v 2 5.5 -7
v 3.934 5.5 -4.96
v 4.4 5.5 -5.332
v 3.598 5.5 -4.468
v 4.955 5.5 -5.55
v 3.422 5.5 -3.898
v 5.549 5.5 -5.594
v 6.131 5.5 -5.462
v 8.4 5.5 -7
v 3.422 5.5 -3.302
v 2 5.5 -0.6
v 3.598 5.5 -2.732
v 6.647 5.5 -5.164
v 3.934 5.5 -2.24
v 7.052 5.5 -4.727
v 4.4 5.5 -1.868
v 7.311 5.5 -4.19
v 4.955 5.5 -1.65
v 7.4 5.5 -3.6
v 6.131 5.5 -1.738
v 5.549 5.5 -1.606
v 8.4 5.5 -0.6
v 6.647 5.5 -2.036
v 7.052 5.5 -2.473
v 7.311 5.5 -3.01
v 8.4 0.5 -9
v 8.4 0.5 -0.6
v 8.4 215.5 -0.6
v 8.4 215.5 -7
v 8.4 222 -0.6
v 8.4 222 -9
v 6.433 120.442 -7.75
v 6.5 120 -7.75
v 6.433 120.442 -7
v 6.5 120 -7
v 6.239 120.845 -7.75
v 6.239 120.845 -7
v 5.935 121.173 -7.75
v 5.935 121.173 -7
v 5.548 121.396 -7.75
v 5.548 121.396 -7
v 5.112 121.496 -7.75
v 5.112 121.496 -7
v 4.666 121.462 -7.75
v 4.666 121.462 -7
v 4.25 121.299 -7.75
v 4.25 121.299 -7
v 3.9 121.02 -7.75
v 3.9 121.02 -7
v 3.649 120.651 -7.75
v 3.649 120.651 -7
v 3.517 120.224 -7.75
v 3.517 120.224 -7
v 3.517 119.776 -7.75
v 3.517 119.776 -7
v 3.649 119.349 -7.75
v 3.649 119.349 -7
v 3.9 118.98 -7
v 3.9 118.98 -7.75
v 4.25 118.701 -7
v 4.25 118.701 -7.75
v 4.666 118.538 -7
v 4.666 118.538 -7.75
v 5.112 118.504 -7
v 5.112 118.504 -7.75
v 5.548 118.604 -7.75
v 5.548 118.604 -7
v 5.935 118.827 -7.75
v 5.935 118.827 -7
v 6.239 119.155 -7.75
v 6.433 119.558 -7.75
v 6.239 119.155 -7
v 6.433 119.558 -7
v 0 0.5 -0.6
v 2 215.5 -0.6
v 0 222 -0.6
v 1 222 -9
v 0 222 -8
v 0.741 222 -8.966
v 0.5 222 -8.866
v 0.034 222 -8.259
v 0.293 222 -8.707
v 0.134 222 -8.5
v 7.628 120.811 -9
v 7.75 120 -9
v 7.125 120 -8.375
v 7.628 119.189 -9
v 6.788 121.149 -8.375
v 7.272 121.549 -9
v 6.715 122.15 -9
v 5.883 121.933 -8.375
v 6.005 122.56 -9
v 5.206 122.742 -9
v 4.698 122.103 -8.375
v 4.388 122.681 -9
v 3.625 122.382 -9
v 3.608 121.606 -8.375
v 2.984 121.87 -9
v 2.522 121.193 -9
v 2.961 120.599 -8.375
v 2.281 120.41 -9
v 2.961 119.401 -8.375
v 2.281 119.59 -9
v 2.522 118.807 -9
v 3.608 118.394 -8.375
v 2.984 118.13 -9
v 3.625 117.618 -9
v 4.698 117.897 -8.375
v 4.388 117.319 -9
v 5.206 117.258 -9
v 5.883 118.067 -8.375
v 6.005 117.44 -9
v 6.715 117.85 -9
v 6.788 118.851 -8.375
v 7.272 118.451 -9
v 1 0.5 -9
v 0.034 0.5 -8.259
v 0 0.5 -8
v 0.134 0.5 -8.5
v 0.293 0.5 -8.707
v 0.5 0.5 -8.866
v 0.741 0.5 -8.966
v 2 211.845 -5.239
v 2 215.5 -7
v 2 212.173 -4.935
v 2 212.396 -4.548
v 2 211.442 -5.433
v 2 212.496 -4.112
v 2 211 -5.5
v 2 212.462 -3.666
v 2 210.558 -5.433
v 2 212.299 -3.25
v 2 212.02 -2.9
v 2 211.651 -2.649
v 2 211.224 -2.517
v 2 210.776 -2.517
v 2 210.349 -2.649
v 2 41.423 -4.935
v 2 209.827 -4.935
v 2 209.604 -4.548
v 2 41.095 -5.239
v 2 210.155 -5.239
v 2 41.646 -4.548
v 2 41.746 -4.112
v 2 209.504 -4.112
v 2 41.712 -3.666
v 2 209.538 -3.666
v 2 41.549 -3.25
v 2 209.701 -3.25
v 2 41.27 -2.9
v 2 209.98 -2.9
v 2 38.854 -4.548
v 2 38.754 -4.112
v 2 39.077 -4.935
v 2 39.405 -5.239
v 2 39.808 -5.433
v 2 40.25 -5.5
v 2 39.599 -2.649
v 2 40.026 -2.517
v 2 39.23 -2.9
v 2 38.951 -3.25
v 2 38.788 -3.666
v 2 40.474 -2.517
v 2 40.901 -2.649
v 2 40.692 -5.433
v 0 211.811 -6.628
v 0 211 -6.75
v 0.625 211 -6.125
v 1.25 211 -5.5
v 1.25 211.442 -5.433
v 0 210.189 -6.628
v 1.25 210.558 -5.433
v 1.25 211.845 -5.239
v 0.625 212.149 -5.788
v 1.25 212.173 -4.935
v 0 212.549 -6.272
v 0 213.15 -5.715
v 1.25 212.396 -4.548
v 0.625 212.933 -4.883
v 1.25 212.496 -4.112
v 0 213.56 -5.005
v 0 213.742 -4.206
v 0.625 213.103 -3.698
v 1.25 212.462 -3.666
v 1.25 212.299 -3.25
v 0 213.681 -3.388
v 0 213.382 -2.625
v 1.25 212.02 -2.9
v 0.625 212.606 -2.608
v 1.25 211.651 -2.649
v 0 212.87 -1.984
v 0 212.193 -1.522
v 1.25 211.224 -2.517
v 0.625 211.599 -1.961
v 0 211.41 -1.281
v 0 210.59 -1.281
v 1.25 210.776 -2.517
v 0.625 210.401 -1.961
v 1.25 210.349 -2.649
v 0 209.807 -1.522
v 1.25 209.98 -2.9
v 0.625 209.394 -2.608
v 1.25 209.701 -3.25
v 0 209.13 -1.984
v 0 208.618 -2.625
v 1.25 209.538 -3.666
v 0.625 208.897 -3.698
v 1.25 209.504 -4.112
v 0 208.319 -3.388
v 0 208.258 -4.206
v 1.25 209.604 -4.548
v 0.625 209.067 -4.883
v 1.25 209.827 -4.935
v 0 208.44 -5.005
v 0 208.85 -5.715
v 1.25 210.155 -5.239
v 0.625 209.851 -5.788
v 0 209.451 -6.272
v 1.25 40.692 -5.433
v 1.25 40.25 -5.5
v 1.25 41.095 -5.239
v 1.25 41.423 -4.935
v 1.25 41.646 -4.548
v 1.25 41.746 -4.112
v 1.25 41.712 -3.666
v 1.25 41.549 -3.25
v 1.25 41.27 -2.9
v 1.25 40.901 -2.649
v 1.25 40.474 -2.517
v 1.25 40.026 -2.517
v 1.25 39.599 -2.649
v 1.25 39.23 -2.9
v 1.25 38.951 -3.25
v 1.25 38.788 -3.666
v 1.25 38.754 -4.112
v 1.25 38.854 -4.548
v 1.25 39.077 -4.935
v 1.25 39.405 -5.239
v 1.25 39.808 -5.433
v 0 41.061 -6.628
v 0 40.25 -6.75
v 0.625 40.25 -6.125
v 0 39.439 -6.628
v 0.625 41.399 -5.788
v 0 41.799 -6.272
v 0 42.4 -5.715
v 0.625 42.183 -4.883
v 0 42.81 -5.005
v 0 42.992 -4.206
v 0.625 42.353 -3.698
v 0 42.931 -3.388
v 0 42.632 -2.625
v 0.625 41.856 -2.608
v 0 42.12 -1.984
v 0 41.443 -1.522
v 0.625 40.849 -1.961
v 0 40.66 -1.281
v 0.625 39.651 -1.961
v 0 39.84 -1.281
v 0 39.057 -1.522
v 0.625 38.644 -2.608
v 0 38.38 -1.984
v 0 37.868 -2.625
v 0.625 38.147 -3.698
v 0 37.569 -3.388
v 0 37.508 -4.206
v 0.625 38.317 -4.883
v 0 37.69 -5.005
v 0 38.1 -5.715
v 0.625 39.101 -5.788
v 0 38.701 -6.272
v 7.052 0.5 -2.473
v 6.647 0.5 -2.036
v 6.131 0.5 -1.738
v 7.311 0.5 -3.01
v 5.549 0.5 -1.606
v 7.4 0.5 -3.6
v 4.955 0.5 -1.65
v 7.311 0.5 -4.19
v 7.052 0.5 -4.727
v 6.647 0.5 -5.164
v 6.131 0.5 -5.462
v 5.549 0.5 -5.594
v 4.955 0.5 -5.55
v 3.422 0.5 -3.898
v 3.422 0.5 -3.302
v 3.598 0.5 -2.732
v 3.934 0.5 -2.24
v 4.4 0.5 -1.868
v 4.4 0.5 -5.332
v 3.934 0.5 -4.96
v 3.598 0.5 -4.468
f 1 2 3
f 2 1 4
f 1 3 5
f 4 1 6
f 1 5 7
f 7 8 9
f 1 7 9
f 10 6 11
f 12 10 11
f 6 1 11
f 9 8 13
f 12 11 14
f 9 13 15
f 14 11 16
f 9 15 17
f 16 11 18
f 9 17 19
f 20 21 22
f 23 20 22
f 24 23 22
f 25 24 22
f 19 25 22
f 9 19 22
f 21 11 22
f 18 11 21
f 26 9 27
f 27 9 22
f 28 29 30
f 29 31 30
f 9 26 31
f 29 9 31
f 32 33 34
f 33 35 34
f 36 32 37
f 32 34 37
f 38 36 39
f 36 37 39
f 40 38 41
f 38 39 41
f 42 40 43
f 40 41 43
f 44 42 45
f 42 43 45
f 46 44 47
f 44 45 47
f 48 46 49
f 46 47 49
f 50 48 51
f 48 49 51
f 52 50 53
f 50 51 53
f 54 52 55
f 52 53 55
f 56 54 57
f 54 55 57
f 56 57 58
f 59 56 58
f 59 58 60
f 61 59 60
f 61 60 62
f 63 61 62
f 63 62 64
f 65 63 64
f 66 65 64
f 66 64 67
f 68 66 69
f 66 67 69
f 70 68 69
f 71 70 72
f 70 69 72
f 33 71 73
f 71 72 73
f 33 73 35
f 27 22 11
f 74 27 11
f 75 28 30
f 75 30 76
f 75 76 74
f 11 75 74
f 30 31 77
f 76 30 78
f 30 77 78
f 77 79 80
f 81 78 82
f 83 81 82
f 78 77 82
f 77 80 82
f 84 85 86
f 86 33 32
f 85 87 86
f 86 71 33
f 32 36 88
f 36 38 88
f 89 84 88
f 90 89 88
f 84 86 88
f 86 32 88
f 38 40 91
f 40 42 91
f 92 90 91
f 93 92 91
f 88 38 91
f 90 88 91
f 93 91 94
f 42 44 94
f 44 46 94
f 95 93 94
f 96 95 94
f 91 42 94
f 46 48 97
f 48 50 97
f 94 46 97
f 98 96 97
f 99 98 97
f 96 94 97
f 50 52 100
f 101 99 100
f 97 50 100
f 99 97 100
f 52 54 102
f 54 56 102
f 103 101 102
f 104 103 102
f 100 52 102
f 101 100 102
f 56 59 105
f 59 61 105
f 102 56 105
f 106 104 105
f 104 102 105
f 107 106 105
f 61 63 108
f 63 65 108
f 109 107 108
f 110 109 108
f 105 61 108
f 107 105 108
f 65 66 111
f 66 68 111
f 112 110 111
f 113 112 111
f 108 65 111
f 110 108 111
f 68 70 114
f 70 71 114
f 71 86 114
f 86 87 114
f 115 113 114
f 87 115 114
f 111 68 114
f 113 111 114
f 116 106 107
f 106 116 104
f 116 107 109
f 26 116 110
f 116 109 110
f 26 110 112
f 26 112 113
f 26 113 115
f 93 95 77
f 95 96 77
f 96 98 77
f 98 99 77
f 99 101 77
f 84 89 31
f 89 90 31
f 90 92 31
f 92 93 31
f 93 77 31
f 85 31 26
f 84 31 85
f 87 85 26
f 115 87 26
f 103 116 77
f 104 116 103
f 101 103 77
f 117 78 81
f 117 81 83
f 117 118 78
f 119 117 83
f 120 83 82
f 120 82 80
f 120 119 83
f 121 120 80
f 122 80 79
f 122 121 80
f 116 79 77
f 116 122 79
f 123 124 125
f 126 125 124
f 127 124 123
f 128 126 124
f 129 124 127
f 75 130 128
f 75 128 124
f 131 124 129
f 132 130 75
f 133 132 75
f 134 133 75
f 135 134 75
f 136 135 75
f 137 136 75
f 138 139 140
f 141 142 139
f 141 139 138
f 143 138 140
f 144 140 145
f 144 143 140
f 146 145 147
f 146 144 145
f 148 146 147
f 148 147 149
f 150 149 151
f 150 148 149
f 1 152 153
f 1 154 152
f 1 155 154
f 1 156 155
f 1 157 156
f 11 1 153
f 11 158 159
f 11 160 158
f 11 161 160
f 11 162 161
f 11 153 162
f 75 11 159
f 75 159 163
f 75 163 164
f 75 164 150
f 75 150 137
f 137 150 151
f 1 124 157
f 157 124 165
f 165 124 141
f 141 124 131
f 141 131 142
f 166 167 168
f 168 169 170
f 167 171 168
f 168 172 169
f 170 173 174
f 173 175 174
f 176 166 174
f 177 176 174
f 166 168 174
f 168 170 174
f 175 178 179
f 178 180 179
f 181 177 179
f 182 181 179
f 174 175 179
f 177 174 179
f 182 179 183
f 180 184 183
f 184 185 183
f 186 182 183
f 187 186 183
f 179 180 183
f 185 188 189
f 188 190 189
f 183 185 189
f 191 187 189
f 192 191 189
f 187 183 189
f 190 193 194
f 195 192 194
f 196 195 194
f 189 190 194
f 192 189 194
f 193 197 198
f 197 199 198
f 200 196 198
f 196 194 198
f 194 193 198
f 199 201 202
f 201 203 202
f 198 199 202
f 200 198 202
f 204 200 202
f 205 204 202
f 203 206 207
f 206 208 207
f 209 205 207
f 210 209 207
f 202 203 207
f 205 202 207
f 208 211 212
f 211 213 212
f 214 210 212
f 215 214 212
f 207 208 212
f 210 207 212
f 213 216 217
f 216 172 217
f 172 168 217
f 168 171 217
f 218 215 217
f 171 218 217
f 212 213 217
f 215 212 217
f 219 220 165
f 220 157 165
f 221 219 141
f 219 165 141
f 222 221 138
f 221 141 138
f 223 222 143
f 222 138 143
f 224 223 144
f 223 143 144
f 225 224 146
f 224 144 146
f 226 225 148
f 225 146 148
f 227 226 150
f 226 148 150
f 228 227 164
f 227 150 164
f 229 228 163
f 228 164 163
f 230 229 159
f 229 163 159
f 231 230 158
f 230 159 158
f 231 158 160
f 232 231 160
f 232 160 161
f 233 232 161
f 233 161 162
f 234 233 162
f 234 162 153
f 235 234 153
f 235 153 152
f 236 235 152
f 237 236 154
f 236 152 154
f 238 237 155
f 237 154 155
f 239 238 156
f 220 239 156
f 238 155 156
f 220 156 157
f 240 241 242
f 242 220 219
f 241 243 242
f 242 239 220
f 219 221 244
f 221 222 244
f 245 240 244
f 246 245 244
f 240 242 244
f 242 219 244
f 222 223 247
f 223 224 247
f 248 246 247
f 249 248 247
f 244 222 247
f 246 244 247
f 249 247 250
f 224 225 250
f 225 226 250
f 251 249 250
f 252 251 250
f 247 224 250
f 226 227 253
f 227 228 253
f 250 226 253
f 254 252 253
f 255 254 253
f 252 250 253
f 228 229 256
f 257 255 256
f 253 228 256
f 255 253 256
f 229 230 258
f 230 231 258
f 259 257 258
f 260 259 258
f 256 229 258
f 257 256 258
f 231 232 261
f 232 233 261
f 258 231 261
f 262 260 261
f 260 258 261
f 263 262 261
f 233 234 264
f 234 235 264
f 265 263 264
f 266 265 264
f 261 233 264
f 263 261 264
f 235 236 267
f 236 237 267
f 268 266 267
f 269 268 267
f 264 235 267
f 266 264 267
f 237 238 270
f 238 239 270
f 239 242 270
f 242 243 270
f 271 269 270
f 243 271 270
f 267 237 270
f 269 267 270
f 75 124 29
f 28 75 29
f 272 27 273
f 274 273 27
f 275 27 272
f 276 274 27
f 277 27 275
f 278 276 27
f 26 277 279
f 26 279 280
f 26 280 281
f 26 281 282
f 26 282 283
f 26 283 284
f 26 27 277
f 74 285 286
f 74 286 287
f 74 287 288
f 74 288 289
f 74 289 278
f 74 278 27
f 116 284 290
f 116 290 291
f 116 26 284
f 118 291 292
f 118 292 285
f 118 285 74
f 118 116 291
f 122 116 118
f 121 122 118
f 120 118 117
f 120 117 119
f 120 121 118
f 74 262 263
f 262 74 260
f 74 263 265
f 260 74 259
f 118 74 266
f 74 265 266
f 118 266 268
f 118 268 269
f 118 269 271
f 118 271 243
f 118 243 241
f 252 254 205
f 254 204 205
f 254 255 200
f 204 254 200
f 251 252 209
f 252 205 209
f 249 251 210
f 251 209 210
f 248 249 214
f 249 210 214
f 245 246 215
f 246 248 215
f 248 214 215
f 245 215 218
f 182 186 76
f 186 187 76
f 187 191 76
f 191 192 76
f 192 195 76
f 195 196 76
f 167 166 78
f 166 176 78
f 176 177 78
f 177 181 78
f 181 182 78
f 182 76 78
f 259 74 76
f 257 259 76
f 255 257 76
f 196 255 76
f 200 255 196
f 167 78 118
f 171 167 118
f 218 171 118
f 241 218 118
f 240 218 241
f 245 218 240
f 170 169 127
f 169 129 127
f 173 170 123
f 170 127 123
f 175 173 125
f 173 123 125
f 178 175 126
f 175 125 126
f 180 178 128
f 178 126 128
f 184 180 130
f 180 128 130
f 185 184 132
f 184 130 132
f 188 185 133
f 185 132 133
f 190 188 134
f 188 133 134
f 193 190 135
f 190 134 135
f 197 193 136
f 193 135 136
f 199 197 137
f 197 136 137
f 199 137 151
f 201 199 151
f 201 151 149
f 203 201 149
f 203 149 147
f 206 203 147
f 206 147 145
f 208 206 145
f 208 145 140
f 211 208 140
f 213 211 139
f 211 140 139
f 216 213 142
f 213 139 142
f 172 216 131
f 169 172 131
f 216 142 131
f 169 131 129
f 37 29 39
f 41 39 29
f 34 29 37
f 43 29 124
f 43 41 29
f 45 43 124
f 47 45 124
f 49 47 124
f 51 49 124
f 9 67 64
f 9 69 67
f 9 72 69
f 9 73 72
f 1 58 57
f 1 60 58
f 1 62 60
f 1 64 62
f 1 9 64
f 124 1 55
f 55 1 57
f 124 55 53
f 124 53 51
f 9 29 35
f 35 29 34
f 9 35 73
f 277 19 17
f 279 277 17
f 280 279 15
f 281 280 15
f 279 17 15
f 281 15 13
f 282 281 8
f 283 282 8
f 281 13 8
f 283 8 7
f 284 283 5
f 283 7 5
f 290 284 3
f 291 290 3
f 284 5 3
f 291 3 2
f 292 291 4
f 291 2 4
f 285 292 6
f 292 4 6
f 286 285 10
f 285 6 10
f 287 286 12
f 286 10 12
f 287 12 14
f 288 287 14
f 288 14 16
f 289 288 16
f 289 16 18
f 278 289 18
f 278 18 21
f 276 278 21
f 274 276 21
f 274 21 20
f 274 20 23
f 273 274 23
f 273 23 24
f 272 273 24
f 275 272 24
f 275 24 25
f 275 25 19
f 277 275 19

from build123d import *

# Parameters (mm, degrees)
BOSS_EXTRUDE1_DEPTH                                 = 221.5
CSK_FOR_M3_COUNTERSUNK_FLAT_HEAD_SCREW1_D           = 3
CSK_FOR_M3_COUNTERSUNK_FLAT_HEAD_SCREW1_CSINK_D     = 5.5
CSK_FOR_M3_COUNTERSUNK_FLAT_HEAD_SCREW1_CSINK_ANGLE = 90
CSK_FOR_M3_COUNTERSUNK_FLAT_HEAD_SCREW4_D           = 3
CSK_FOR_M3_COUNTERSUNK_FLAT_HEAD_SCREW4_CSINK_D     = 5.5
CSK_FOR_M3_COUNTERSUNK_FLAT_HEAD_SCREW4_CSINK_ANGLE = 90
SKETCH12_W                                          = 8
SKETCH12_H                                          = 7
BOSS_EXTRUDE2_DEPTH                                 = 5.5
CUT_EXTRUDE1_DEPTH                                  = 359
BOSS_EXTRUDE3_DEPTH                                 = 3
BOSS_EXTRUDE4_DEPTH                                 = 2.5
BOSS_EXTRUDE4_DEPTH_BACK                            = 6
SKETCH19_W                                          = 9
SKETCH19_H                                          = 2
CUT_EXTRUDE2_DEPTH                                  = 10
SKETCH20_W                                          = 0.6
SKETCH20_H                                          = 225
CUT_EXTRUDE3_DEPTH                                  = 10
SKETCH22_W                                          = 0.6
SKETCH22_H                                          = 225
CUT_EXTRUDE4_DEPTH                                  = 10
SKETCH25_W                                          = 8.4
SKETCH25_H                                          = 5.5
CUT_EXTRUDE5_DEPTH                                  = 10
BOSS_EXTRUDE5_DEPTH                                 = 2
TAP_DRILL_FOR_M4X0_7_TAP1_D                         = 4
TAP_DRILL_FOR_M4X0_7_TAP1_DEPTH                     = 5
BOSS_EXTRUDE6_DEPTH                                 = 221.5
FILLET1_R                                           = 1


with BuildPart() as part:
    # Sketch1 → Boss-Extrude1 (new body)
    with BuildSketch(Plane(origin=(0, 0, 0), x_dir=(1, 0, 0), z_dir=(0, 1, 0))):
        Polygon((0, 0), (0, 9), (9, 9), (9, 7), (2, 7), (2, 0), align=None)
    extrude(amount=BOSS_EXTRUDE1_DEPTH)

    # CSK for M3 Countersunk Flat Head Screw1 (through all)
    with Locations(Plane.ZY):
        with Locations((-4, 211), (-4, 40.25)):
            CounterSinkHole(CSK_FOR_M3_COUNTERSUNK_FLAT_HEAD_SCREW1_D / 2, CSK_FOR_M3_COUNTERSUNK_FLAT_HEAD_SCREW1_CSINK_D / 2, counter_sink_angle=CSK_FOR_M3_COUNTERSUNK_FLAT_HEAD_SCREW1_CSINK_ANGLE)

    # CSK for M3 Countersunk Flat Head Screw4 (through all)
    with Locations(Plane(origin=(0, 0, -9), x_dir=(-1, 0, 0), z_dir=(0, 0, -1))):
        with Locations((-5, 120)):
            CounterSinkHole(CSK_FOR_M3_COUNTERSUNK_FLAT_HEAD_SCREW4_D / 2, CSK_FOR_M3_COUNTERSUNK_FLAT_HEAD_SCREW4_CSINK_D / 2, counter_sink_angle=CSK_FOR_M3_COUNTERSUNK_FLAT_HEAD_SCREW4_CSINK_ANGLE)

    # Sketch12 → Boss-Extrude2 (add)
    with BuildSketch(Plane.XZ):
        with Locations((5, -3.5)):
            Rectangle(SKETCH12_W, SKETCH12_H)
    extrude(amount=-BOSS_EXTRUDE2_DEPTH)

    # Sketch13 → Cut-Extrude1 (cut)
    with BuildSketch(Plane(origin=(0, 221.5, 0), x_dir=(1, 0, 0), z_dir=(0, 1, 0))):
        Polygon((0, 8), (1, 9), (0, 9), align=None)
    extrude(amount=-CUT_EXTRUDE1_DEPTH, mode=Mode.SUBTRACT)

    # Sketch14 → Boss-Extrude3 (add)
    with BuildSketch(Plane.XZ):
        Polygon((0, 0), (9, 0), (9, -9), (1, -9), (0, -8), align=None)
    extrude(amount=BOSS_EXTRUDE3_DEPTH)

    # Sketch18 → Boss-Extrude4 (add, two sides: drawn at the far end of the back side and taken through both)
    with BuildSketch(Plane(origin=(0, 221.5, 0), x_dir=(1, 0, 0), z_dir=(0, 1, 0)).offset(-BOSS_EXTRUDE4_DEPTH_BACK)):
        Polygon((0, 0), (9, 0), (9, 9), (1, 9), (0, 8), align=None)
    extrude(amount=BOSS_EXTRUDE4_DEPTH + BOSS_EXTRUDE4_DEPTH_BACK)

    # Sketch19 → Cut-Extrude2 (cut)
    with BuildSketch(Plane(origin=(0, 0, -9), x_dir=(-1, 0, 0), z_dir=(0, 0, -1))):
        with Locations((-4.5, 223)):
            Rectangle(SKETCH19_W, SKETCH19_H)
    extrude(amount=-CUT_EXTRUDE2_DEPTH, mode=Mode.SUBTRACT)

    # Sketch20 → Cut-Extrude3 (cut)
    with BuildSketch(Plane.ZY):
        with Locations((-0.3, 109.5)):
            Rectangle(SKETCH20_W, SKETCH20_H)
    extrude(amount=-CUT_EXTRUDE3_DEPTH, mode=Mode.SUBTRACT)

    # Sketch22 → Cut-Extrude4 (cut)
    with BuildSketch(Plane(origin=(0, 0, -9), x_dir=(-1, 0, 0), z_dir=(0, 0, -1))):
        with Locations((-8.7, 109.5)):
            Rectangle(SKETCH22_W, SKETCH22_H)
    extrude(amount=-CUT_EXTRUDE4_DEPTH, mode=Mode.SUBTRACT)

    # Sketch25 → Cut-Extrude5 (cut)
    with BuildSketch(Plane.ZY):
        with Locations((-4.8, -0.25)):
            Rectangle(SKETCH25_W, SKETCH25_H)
    extrude(amount=-CUT_EXTRUDE5_DEPTH, mode=Mode.SUBTRACT)

    # Sketch29 → Boss-Extrude5 (add)
    with BuildSketch(Plane.XZ.offset(-2.5)):
        Polygon((8.4, -0.6), (0, -0.6), (0, -8), (1, -9), (8.4, -9), align=None)
    extrude(amount=BOSS_EXTRUDE5_DEPTH)

    # Tap Drill for M4x0.7 Tap1
    with Locations(Plane(origin=(0, 0.5, 0), x_dir=(-1, 0, 0), z_dir=(0, -1, 0))):
        with Locations((-5.4, 3.6)):
            Hole(TAP_DRILL_FOR_M4X0_7_TAP1_D / 2, depth=TAP_DRILL_FOR_M4X0_7_TAP1_DEPTH)

    # Sketch32 → Boss-Extrude6 (add)
    with BuildSketch(Plane(origin=(0, 222, 0), x_dir=(1, 0, 0), z_dir=(0, 1, 0))):
        Polygon((1, 9), (0, 8), (0, 9), align=None)
    extrude(amount=-BOSS_EXTRUDE6_DEPTH)

    # Fillet1
    fillet1_edges = [part.edges().sort_by_distance(p)[0] for p in [
        (0, 111.25, -9),
    ]]
    fillet(fillet1_edges, radius=FILLET1_R)


solid = part.part
